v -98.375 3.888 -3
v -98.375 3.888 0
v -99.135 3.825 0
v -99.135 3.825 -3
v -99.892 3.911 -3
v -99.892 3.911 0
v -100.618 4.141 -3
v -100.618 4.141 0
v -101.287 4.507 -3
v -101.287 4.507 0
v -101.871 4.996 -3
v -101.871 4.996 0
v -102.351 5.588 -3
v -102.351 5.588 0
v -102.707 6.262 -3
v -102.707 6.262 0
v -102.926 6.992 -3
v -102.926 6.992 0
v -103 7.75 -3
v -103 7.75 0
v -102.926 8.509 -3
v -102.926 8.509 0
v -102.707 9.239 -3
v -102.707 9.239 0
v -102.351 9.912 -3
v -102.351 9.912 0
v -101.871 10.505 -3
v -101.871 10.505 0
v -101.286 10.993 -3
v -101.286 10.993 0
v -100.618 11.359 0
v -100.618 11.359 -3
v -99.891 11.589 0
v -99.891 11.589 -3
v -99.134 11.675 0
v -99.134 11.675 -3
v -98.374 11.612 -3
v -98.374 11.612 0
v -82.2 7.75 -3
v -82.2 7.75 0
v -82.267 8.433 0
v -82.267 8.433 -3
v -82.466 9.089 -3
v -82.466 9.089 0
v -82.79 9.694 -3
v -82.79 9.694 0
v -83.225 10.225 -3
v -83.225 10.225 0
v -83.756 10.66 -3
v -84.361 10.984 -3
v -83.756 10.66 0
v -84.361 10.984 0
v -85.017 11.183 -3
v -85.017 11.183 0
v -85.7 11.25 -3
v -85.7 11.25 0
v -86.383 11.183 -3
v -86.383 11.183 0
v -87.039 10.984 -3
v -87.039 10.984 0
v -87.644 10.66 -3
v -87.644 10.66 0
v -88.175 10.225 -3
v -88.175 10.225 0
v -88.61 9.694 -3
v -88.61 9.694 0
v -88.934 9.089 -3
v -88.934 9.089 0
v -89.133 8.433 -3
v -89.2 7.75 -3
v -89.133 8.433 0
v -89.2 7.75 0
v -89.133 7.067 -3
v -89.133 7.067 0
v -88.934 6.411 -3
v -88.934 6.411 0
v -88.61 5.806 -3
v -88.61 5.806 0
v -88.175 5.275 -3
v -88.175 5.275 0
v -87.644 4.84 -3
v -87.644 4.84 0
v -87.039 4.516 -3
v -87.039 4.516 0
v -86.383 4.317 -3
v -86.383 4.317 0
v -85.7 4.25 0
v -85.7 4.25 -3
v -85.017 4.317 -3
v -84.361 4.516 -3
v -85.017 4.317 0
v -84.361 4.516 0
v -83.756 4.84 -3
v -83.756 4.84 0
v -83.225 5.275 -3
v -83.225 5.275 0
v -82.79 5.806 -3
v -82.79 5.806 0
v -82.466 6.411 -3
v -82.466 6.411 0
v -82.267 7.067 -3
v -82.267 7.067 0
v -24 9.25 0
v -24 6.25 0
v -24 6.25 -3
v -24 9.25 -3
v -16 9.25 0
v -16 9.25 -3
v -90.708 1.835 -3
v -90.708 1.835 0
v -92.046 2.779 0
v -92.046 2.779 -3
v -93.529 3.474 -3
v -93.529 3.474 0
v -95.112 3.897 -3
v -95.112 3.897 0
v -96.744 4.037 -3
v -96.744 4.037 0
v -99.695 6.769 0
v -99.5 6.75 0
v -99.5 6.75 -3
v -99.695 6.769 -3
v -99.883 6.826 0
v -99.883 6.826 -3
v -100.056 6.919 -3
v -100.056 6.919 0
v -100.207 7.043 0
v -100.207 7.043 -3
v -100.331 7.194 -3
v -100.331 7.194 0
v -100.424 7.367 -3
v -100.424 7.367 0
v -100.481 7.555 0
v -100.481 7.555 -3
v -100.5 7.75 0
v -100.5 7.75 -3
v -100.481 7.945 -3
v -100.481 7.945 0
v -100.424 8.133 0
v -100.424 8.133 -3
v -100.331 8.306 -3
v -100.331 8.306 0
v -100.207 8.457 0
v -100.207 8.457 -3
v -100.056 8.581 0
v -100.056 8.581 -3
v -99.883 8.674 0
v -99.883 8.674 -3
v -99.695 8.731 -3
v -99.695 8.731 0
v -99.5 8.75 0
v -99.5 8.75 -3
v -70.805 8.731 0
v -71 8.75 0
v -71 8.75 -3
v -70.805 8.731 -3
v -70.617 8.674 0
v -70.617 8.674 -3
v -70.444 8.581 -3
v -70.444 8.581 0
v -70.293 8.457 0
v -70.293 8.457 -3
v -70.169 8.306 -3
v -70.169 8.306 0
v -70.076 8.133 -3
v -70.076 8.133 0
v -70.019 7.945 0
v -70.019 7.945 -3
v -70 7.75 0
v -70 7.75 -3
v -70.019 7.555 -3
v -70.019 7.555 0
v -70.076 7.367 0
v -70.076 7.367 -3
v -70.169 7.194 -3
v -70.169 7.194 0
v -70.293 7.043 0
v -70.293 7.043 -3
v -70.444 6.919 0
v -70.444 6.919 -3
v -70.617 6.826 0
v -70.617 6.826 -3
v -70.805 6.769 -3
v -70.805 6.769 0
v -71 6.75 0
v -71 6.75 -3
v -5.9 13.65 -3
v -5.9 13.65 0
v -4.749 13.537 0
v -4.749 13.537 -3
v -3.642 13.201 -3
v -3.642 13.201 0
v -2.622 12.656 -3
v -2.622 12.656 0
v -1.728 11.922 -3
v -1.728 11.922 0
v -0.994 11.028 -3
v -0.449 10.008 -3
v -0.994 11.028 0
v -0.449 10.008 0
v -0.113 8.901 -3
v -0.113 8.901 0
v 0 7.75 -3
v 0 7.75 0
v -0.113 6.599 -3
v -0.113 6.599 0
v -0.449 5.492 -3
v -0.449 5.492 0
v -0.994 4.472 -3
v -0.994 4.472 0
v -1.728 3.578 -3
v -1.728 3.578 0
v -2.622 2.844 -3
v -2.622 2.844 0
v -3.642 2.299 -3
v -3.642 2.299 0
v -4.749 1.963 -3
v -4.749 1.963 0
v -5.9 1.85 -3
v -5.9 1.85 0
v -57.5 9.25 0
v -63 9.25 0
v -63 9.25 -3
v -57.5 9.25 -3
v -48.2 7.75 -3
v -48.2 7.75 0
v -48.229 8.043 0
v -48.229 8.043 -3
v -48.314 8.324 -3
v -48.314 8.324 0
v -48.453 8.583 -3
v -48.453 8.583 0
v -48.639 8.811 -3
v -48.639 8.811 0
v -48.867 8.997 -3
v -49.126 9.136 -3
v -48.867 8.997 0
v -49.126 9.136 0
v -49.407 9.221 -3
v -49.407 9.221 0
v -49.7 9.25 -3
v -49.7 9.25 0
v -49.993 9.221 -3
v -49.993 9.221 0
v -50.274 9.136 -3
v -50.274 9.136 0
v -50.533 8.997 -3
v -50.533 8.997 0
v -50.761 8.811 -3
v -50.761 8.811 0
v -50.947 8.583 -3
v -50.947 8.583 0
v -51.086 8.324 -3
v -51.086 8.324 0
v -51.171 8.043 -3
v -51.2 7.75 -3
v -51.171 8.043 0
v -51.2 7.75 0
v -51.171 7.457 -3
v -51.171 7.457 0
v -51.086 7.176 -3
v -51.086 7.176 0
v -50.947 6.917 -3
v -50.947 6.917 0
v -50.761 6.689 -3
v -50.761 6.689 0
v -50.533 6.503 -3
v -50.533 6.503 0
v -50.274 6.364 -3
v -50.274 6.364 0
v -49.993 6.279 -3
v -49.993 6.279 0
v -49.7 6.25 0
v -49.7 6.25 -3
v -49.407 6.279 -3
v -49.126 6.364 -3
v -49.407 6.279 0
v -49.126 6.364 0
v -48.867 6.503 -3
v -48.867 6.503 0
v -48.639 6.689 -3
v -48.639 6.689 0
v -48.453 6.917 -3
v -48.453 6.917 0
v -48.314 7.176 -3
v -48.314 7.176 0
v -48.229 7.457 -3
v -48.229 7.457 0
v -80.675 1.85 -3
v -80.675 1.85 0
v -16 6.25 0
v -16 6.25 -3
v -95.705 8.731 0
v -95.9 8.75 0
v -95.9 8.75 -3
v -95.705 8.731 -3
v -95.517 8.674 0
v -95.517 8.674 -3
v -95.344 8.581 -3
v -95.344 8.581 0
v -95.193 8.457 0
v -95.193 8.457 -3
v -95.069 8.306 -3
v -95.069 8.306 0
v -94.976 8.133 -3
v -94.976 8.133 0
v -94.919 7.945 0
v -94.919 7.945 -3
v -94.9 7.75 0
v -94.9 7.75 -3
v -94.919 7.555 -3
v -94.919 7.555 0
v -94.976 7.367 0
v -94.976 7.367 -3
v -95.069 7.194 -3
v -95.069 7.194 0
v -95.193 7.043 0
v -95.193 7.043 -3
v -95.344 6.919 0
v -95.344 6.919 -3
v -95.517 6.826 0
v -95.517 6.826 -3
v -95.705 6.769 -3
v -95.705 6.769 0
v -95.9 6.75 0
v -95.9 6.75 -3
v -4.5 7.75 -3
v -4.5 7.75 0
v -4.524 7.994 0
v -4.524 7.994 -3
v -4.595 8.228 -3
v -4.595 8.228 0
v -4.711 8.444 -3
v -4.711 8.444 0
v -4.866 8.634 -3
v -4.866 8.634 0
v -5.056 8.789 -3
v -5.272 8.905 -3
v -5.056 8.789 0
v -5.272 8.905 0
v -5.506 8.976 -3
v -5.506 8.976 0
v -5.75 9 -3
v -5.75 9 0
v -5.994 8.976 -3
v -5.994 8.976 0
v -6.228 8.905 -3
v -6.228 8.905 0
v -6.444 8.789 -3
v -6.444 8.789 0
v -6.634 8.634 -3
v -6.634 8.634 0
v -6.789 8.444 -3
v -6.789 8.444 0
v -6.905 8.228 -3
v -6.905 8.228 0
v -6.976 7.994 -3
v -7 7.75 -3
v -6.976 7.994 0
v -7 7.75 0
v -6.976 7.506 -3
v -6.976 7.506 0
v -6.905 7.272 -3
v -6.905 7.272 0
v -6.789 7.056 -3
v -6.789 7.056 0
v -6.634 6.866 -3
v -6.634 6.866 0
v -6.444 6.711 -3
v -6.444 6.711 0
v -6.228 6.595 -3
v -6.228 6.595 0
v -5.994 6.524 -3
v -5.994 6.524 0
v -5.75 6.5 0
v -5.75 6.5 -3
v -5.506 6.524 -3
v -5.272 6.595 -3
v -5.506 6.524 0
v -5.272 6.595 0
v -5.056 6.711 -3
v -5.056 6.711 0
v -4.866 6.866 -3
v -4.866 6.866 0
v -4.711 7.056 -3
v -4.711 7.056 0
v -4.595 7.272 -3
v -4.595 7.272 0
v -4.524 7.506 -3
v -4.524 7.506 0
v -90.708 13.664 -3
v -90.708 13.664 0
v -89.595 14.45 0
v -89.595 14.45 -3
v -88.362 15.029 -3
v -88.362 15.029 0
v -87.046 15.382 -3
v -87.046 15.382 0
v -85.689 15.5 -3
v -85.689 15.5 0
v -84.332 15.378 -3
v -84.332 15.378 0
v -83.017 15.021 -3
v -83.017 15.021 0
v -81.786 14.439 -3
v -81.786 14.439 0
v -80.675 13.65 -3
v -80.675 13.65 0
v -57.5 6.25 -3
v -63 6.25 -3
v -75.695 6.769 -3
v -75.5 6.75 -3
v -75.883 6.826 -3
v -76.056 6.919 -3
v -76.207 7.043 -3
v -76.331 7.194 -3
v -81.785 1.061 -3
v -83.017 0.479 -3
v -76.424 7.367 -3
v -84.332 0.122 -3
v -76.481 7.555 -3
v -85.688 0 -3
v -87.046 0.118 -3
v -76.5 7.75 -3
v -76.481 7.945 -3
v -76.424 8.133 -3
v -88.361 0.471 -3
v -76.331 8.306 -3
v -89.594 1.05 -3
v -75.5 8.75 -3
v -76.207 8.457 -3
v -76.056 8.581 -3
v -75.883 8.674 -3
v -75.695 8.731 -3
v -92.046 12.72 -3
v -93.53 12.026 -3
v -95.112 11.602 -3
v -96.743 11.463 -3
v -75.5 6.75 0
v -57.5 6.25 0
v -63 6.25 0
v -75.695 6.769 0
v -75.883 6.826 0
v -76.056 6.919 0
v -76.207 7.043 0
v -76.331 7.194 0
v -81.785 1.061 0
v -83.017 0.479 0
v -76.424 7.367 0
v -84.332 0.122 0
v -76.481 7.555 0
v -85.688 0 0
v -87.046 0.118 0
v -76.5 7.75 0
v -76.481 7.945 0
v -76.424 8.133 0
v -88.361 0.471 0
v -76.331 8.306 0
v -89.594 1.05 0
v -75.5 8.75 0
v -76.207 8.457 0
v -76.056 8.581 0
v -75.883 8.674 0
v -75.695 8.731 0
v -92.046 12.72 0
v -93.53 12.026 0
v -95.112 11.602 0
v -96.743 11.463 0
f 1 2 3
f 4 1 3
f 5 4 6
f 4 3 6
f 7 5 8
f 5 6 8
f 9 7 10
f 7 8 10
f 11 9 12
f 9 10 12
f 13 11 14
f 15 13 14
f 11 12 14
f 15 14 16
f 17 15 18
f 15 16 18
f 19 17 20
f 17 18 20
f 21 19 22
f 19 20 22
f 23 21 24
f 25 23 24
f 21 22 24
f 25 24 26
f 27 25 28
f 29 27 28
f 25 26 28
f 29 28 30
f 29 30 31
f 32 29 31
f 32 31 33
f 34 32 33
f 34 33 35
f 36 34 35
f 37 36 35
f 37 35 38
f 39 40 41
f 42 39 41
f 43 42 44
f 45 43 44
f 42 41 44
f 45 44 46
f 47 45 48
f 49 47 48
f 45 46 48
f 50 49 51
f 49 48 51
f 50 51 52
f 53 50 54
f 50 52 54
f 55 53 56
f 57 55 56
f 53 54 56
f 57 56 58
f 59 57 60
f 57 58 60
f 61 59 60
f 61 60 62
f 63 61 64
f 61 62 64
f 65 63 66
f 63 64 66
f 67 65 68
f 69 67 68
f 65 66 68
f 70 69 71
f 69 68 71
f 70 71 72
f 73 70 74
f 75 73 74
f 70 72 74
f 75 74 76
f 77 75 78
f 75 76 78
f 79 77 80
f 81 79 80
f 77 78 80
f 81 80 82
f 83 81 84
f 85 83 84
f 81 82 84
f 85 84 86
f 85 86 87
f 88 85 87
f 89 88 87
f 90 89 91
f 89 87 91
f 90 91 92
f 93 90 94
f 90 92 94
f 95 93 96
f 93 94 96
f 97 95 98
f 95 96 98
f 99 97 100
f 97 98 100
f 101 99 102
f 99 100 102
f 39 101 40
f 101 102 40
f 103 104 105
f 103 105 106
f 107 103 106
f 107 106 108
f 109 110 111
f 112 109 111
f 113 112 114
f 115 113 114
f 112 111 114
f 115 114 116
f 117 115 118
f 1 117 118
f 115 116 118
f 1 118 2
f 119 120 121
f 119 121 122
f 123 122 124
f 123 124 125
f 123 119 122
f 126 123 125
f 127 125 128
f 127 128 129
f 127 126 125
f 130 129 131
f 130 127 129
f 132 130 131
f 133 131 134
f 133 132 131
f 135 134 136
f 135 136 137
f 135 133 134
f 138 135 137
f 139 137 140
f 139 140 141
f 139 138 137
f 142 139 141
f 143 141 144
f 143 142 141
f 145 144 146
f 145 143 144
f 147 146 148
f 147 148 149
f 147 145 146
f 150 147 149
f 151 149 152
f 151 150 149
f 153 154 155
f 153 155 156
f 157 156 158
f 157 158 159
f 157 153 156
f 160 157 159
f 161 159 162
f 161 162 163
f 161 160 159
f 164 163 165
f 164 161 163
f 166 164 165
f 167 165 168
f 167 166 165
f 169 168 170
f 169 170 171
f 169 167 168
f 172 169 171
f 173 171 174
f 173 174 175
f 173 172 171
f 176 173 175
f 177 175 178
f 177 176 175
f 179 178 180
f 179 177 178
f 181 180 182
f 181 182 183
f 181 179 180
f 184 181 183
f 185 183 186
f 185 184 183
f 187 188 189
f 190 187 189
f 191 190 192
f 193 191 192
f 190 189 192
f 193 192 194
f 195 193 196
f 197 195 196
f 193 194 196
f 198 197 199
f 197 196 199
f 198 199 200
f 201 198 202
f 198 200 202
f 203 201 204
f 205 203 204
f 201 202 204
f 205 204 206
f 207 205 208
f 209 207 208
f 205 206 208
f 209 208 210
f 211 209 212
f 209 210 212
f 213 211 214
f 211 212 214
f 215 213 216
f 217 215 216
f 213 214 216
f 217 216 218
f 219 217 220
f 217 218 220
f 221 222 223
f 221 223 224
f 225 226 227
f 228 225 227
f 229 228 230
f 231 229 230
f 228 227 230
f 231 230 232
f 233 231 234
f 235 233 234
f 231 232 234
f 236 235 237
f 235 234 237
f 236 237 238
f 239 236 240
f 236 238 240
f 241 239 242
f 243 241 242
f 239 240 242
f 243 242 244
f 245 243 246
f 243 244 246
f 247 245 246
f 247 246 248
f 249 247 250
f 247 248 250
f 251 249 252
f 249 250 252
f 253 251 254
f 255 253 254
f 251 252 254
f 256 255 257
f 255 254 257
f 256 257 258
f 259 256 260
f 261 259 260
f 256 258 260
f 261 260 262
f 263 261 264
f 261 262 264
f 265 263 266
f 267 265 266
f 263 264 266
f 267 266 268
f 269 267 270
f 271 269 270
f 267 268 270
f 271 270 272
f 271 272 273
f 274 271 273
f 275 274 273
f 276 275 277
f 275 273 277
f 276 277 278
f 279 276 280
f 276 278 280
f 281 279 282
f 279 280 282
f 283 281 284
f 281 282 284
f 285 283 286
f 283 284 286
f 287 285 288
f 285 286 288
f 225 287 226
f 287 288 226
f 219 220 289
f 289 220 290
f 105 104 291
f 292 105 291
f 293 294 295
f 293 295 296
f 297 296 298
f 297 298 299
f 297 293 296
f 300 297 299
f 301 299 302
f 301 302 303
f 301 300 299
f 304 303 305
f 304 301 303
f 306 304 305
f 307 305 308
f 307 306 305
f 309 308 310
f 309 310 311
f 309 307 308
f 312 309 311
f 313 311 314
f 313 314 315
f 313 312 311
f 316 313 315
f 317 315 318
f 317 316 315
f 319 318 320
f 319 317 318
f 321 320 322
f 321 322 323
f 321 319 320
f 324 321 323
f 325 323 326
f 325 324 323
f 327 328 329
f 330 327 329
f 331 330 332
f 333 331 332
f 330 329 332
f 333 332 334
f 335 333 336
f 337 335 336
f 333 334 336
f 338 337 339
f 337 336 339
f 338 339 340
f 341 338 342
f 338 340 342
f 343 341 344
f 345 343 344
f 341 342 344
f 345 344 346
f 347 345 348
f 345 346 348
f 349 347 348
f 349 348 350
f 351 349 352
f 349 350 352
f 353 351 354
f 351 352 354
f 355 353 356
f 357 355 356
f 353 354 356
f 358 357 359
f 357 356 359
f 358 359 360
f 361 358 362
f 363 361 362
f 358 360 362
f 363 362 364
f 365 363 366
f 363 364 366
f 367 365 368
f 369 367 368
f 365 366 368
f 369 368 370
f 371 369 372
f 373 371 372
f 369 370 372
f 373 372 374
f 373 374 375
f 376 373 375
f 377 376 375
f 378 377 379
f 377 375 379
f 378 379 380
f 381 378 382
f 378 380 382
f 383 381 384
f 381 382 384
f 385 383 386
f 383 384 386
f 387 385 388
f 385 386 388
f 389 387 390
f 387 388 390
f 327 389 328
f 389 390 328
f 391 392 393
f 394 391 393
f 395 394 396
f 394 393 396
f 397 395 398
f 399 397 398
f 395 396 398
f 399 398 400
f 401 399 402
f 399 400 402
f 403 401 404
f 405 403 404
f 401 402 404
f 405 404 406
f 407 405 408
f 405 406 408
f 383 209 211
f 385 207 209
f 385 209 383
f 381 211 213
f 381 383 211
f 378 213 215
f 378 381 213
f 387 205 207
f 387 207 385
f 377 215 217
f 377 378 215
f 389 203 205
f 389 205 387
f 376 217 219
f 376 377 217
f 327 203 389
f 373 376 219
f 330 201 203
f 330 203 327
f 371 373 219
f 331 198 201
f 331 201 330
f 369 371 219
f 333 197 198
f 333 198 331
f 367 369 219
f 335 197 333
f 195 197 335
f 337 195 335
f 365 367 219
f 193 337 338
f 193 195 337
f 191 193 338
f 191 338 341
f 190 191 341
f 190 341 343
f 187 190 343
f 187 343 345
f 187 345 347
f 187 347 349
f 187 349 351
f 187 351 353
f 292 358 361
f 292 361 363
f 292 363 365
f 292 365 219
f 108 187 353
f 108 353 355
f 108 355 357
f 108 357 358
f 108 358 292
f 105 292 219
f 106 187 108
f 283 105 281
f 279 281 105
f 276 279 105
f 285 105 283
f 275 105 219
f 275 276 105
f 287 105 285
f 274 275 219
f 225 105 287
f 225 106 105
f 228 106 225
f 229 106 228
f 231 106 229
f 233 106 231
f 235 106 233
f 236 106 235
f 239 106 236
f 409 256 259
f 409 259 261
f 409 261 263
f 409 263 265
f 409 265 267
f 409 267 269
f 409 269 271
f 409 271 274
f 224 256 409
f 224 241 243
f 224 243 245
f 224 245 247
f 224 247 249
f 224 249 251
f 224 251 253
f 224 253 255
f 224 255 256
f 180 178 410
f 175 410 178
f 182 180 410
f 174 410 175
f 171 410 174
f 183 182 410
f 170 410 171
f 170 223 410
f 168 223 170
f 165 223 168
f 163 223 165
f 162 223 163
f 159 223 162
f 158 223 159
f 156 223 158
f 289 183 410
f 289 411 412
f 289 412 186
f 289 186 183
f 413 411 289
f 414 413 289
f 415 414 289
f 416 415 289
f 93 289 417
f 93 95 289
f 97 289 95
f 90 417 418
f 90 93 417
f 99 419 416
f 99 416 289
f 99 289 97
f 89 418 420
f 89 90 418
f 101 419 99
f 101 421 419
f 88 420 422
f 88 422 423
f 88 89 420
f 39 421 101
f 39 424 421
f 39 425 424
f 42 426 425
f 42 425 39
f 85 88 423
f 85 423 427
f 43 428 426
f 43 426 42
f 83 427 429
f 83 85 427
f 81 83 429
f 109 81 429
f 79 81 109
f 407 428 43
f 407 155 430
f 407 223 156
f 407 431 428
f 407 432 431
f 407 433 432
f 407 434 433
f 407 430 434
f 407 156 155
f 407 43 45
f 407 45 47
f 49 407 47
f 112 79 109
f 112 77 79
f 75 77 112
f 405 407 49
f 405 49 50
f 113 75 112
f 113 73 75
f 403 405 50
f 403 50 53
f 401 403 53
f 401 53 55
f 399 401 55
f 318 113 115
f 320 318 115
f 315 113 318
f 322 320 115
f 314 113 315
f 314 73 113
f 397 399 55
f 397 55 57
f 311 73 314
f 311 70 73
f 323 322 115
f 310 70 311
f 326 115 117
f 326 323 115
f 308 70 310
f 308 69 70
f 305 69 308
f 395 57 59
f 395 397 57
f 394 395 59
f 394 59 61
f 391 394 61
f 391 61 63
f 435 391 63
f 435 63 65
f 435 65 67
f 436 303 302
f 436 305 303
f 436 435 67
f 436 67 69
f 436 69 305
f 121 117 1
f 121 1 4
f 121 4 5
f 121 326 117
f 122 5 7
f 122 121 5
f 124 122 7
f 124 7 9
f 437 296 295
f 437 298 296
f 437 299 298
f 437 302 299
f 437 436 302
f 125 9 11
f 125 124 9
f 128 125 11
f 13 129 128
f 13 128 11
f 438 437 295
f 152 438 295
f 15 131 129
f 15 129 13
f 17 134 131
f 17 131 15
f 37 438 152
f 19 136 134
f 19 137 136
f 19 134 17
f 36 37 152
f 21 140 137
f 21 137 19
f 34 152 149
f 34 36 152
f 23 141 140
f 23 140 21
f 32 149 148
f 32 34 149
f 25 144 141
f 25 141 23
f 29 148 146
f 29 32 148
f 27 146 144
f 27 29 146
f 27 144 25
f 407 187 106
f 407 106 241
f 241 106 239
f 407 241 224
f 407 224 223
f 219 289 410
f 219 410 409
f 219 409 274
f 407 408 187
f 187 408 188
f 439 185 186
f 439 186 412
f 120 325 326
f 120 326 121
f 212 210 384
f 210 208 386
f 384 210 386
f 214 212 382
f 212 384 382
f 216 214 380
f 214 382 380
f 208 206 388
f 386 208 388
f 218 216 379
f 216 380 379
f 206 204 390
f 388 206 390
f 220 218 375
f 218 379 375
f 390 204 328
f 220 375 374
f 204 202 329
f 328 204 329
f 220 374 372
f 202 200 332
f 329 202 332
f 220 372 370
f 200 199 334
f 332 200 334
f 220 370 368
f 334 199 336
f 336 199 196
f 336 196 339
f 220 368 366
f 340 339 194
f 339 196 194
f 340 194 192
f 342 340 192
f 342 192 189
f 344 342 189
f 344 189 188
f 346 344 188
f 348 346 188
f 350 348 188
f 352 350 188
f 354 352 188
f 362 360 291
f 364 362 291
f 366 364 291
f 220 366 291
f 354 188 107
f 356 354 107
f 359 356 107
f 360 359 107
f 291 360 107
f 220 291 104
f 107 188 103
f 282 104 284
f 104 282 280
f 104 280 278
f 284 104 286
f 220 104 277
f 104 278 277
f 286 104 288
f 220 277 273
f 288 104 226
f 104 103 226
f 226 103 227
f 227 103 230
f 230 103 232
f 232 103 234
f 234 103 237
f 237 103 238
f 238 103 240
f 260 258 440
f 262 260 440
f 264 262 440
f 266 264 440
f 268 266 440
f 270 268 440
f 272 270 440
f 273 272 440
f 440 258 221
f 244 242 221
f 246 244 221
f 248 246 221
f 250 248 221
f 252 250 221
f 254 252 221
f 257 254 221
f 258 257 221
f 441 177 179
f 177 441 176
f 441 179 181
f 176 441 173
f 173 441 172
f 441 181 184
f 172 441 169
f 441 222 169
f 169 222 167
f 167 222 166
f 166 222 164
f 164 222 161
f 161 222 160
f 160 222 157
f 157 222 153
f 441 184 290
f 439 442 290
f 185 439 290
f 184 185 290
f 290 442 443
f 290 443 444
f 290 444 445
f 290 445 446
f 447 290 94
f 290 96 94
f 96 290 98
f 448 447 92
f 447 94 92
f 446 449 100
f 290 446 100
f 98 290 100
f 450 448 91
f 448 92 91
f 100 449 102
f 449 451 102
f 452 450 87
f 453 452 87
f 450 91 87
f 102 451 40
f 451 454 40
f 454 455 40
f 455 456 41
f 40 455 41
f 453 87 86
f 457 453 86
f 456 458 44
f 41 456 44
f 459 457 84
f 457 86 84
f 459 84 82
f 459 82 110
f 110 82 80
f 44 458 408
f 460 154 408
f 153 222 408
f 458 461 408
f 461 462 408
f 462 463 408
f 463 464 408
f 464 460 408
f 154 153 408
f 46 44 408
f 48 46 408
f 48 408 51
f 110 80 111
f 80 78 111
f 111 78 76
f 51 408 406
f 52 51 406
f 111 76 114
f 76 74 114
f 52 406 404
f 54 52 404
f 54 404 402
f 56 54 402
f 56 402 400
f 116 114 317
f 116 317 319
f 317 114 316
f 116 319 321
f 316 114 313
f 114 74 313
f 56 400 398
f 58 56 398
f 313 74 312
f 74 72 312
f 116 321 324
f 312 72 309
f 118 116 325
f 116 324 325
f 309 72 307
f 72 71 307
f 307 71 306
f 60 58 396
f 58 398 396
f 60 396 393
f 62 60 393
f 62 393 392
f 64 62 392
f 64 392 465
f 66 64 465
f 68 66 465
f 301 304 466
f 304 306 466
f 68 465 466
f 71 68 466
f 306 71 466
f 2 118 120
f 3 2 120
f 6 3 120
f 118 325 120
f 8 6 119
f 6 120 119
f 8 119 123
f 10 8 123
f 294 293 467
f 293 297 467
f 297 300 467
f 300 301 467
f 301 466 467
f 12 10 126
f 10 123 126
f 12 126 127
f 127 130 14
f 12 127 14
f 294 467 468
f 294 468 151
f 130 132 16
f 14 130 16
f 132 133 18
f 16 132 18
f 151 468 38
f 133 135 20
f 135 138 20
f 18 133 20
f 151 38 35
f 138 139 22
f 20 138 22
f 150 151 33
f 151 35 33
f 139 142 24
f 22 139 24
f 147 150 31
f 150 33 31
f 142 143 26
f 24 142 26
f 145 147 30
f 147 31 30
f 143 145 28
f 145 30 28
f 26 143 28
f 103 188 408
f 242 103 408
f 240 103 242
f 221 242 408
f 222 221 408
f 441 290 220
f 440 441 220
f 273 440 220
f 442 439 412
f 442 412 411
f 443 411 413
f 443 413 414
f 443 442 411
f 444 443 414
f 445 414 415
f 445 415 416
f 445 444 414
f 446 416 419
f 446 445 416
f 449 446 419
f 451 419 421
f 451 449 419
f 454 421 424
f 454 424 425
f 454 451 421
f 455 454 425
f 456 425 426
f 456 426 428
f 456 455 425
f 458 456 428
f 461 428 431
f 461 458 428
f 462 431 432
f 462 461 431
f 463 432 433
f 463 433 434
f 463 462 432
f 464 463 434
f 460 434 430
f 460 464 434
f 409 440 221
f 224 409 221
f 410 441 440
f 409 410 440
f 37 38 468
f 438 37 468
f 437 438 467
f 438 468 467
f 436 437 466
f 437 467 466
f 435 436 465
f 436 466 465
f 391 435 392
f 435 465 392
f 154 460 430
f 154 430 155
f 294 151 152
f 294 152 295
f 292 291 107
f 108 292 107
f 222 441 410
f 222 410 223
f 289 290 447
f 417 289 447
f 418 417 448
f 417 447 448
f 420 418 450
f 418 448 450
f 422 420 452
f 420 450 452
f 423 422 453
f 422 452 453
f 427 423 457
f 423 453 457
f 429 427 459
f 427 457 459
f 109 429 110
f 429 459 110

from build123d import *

# Parameters (mm, degrees)
ESQUISSE2_R               = 3.5
ESQUISSE2_R_2             = 1.25
ESQUISSE2_R_3             = 1.5
ESQUISSE2_W               = 8
ESQUISSE2_H               = 3
ESQUISSE2_W_2             = 5.5
T_LE_DE_BASE_PLI_E1_DEPTH = 3


# Sheet-metal steps are written as plain solids
with BuildPart() as part:
    # Esquisse2 → Tôle de base pliée1 (new body)
    with BuildSketch(Plane.XY):
        with BuildLine():
            Line((-80.674813436, 13.65), (-5.9, 13.65))
            ThreePointArc((-5.9, 13.65), (0, 7.75), (-5.9, 1.85))
            Line((-5.9, 1.85), (-80.674813436, 1.85))
            ThreePointArc((-80.674813436, 1.85), (-85.688411127, 8.665e-06), (-90.707519116, 1.834997692))
            ThreePointArc((-90.707519116, 1.834997692), (-94.311259808, 3.720569786), (-98.375041782, 3.887917208))
            ThreePointArc((-98.375041782, 3.887917208), (-102.999999988, 7.750307003), (-98.374437627, 11.611973247))
            ThreePointArc((-98.374437627, 11.611973247), (-94.311297529, 11.778940178), (-90.708236779, 13.664394674))
            ThreePointArc((-90.708236779, 13.664394674), (-85.688881301, 15.499992024), (-80.674813436, 13.65))
        make_face()
        with Locations((-85.7, 7.75)):
            Circle(ESQUISSE2_R, mode=Mode.SUBTRACT)
        with Locations((-5.75, 7.75)):
            Circle(ESQUISSE2_R_2, mode=Mode.SUBTRACT)
        with Locations((-49.7, 7.75)):
            Circle(ESQUISSE2_R_3, mode=Mode.SUBTRACT)
        with Locations((-20, 7.75)):
            Rectangle(ESQUISSE2_W, ESQUISSE2_H, mode=Mode.SUBTRACT)
        with Locations((-60.25, 7.75)):
            Rectangle(ESQUISSE2_W_2, ESQUISSE2_H, mode=Mode.SUBTRACT)
        with BuildLine():
            Line((-75.5, 8.75), (-71, 8.75))
            ThreePointArc((-71, 8.75), (-70, 7.75), (-71, 6.75))
            Line((-71, 6.75), (-75.5, 6.75))
            ThreePointArc((-75.5, 6.75), (-76.5, 7.75), (-75.5, 8.75))
        make_face(mode=Mode.SUBTRACT)
        with BuildLine():
            Line((-99.5, 8.75), (-95.9, 8.75))
            ThreePointArc((-95.9, 8.75), (-94.9, 7.75), (-95.9, 6.75))
            Line((-95.9, 6.75), (-99.5, 6.75))
            ThreePointArc((-99.5, 6.75), (-100.5, 7.75), (-99.5, 8.75))
        make_face(mode=Mode.SUBTRACT)
    extrude(amount=-T_LE_DE_BASE_PLI_E1_DEPTH)


solid = part.part
